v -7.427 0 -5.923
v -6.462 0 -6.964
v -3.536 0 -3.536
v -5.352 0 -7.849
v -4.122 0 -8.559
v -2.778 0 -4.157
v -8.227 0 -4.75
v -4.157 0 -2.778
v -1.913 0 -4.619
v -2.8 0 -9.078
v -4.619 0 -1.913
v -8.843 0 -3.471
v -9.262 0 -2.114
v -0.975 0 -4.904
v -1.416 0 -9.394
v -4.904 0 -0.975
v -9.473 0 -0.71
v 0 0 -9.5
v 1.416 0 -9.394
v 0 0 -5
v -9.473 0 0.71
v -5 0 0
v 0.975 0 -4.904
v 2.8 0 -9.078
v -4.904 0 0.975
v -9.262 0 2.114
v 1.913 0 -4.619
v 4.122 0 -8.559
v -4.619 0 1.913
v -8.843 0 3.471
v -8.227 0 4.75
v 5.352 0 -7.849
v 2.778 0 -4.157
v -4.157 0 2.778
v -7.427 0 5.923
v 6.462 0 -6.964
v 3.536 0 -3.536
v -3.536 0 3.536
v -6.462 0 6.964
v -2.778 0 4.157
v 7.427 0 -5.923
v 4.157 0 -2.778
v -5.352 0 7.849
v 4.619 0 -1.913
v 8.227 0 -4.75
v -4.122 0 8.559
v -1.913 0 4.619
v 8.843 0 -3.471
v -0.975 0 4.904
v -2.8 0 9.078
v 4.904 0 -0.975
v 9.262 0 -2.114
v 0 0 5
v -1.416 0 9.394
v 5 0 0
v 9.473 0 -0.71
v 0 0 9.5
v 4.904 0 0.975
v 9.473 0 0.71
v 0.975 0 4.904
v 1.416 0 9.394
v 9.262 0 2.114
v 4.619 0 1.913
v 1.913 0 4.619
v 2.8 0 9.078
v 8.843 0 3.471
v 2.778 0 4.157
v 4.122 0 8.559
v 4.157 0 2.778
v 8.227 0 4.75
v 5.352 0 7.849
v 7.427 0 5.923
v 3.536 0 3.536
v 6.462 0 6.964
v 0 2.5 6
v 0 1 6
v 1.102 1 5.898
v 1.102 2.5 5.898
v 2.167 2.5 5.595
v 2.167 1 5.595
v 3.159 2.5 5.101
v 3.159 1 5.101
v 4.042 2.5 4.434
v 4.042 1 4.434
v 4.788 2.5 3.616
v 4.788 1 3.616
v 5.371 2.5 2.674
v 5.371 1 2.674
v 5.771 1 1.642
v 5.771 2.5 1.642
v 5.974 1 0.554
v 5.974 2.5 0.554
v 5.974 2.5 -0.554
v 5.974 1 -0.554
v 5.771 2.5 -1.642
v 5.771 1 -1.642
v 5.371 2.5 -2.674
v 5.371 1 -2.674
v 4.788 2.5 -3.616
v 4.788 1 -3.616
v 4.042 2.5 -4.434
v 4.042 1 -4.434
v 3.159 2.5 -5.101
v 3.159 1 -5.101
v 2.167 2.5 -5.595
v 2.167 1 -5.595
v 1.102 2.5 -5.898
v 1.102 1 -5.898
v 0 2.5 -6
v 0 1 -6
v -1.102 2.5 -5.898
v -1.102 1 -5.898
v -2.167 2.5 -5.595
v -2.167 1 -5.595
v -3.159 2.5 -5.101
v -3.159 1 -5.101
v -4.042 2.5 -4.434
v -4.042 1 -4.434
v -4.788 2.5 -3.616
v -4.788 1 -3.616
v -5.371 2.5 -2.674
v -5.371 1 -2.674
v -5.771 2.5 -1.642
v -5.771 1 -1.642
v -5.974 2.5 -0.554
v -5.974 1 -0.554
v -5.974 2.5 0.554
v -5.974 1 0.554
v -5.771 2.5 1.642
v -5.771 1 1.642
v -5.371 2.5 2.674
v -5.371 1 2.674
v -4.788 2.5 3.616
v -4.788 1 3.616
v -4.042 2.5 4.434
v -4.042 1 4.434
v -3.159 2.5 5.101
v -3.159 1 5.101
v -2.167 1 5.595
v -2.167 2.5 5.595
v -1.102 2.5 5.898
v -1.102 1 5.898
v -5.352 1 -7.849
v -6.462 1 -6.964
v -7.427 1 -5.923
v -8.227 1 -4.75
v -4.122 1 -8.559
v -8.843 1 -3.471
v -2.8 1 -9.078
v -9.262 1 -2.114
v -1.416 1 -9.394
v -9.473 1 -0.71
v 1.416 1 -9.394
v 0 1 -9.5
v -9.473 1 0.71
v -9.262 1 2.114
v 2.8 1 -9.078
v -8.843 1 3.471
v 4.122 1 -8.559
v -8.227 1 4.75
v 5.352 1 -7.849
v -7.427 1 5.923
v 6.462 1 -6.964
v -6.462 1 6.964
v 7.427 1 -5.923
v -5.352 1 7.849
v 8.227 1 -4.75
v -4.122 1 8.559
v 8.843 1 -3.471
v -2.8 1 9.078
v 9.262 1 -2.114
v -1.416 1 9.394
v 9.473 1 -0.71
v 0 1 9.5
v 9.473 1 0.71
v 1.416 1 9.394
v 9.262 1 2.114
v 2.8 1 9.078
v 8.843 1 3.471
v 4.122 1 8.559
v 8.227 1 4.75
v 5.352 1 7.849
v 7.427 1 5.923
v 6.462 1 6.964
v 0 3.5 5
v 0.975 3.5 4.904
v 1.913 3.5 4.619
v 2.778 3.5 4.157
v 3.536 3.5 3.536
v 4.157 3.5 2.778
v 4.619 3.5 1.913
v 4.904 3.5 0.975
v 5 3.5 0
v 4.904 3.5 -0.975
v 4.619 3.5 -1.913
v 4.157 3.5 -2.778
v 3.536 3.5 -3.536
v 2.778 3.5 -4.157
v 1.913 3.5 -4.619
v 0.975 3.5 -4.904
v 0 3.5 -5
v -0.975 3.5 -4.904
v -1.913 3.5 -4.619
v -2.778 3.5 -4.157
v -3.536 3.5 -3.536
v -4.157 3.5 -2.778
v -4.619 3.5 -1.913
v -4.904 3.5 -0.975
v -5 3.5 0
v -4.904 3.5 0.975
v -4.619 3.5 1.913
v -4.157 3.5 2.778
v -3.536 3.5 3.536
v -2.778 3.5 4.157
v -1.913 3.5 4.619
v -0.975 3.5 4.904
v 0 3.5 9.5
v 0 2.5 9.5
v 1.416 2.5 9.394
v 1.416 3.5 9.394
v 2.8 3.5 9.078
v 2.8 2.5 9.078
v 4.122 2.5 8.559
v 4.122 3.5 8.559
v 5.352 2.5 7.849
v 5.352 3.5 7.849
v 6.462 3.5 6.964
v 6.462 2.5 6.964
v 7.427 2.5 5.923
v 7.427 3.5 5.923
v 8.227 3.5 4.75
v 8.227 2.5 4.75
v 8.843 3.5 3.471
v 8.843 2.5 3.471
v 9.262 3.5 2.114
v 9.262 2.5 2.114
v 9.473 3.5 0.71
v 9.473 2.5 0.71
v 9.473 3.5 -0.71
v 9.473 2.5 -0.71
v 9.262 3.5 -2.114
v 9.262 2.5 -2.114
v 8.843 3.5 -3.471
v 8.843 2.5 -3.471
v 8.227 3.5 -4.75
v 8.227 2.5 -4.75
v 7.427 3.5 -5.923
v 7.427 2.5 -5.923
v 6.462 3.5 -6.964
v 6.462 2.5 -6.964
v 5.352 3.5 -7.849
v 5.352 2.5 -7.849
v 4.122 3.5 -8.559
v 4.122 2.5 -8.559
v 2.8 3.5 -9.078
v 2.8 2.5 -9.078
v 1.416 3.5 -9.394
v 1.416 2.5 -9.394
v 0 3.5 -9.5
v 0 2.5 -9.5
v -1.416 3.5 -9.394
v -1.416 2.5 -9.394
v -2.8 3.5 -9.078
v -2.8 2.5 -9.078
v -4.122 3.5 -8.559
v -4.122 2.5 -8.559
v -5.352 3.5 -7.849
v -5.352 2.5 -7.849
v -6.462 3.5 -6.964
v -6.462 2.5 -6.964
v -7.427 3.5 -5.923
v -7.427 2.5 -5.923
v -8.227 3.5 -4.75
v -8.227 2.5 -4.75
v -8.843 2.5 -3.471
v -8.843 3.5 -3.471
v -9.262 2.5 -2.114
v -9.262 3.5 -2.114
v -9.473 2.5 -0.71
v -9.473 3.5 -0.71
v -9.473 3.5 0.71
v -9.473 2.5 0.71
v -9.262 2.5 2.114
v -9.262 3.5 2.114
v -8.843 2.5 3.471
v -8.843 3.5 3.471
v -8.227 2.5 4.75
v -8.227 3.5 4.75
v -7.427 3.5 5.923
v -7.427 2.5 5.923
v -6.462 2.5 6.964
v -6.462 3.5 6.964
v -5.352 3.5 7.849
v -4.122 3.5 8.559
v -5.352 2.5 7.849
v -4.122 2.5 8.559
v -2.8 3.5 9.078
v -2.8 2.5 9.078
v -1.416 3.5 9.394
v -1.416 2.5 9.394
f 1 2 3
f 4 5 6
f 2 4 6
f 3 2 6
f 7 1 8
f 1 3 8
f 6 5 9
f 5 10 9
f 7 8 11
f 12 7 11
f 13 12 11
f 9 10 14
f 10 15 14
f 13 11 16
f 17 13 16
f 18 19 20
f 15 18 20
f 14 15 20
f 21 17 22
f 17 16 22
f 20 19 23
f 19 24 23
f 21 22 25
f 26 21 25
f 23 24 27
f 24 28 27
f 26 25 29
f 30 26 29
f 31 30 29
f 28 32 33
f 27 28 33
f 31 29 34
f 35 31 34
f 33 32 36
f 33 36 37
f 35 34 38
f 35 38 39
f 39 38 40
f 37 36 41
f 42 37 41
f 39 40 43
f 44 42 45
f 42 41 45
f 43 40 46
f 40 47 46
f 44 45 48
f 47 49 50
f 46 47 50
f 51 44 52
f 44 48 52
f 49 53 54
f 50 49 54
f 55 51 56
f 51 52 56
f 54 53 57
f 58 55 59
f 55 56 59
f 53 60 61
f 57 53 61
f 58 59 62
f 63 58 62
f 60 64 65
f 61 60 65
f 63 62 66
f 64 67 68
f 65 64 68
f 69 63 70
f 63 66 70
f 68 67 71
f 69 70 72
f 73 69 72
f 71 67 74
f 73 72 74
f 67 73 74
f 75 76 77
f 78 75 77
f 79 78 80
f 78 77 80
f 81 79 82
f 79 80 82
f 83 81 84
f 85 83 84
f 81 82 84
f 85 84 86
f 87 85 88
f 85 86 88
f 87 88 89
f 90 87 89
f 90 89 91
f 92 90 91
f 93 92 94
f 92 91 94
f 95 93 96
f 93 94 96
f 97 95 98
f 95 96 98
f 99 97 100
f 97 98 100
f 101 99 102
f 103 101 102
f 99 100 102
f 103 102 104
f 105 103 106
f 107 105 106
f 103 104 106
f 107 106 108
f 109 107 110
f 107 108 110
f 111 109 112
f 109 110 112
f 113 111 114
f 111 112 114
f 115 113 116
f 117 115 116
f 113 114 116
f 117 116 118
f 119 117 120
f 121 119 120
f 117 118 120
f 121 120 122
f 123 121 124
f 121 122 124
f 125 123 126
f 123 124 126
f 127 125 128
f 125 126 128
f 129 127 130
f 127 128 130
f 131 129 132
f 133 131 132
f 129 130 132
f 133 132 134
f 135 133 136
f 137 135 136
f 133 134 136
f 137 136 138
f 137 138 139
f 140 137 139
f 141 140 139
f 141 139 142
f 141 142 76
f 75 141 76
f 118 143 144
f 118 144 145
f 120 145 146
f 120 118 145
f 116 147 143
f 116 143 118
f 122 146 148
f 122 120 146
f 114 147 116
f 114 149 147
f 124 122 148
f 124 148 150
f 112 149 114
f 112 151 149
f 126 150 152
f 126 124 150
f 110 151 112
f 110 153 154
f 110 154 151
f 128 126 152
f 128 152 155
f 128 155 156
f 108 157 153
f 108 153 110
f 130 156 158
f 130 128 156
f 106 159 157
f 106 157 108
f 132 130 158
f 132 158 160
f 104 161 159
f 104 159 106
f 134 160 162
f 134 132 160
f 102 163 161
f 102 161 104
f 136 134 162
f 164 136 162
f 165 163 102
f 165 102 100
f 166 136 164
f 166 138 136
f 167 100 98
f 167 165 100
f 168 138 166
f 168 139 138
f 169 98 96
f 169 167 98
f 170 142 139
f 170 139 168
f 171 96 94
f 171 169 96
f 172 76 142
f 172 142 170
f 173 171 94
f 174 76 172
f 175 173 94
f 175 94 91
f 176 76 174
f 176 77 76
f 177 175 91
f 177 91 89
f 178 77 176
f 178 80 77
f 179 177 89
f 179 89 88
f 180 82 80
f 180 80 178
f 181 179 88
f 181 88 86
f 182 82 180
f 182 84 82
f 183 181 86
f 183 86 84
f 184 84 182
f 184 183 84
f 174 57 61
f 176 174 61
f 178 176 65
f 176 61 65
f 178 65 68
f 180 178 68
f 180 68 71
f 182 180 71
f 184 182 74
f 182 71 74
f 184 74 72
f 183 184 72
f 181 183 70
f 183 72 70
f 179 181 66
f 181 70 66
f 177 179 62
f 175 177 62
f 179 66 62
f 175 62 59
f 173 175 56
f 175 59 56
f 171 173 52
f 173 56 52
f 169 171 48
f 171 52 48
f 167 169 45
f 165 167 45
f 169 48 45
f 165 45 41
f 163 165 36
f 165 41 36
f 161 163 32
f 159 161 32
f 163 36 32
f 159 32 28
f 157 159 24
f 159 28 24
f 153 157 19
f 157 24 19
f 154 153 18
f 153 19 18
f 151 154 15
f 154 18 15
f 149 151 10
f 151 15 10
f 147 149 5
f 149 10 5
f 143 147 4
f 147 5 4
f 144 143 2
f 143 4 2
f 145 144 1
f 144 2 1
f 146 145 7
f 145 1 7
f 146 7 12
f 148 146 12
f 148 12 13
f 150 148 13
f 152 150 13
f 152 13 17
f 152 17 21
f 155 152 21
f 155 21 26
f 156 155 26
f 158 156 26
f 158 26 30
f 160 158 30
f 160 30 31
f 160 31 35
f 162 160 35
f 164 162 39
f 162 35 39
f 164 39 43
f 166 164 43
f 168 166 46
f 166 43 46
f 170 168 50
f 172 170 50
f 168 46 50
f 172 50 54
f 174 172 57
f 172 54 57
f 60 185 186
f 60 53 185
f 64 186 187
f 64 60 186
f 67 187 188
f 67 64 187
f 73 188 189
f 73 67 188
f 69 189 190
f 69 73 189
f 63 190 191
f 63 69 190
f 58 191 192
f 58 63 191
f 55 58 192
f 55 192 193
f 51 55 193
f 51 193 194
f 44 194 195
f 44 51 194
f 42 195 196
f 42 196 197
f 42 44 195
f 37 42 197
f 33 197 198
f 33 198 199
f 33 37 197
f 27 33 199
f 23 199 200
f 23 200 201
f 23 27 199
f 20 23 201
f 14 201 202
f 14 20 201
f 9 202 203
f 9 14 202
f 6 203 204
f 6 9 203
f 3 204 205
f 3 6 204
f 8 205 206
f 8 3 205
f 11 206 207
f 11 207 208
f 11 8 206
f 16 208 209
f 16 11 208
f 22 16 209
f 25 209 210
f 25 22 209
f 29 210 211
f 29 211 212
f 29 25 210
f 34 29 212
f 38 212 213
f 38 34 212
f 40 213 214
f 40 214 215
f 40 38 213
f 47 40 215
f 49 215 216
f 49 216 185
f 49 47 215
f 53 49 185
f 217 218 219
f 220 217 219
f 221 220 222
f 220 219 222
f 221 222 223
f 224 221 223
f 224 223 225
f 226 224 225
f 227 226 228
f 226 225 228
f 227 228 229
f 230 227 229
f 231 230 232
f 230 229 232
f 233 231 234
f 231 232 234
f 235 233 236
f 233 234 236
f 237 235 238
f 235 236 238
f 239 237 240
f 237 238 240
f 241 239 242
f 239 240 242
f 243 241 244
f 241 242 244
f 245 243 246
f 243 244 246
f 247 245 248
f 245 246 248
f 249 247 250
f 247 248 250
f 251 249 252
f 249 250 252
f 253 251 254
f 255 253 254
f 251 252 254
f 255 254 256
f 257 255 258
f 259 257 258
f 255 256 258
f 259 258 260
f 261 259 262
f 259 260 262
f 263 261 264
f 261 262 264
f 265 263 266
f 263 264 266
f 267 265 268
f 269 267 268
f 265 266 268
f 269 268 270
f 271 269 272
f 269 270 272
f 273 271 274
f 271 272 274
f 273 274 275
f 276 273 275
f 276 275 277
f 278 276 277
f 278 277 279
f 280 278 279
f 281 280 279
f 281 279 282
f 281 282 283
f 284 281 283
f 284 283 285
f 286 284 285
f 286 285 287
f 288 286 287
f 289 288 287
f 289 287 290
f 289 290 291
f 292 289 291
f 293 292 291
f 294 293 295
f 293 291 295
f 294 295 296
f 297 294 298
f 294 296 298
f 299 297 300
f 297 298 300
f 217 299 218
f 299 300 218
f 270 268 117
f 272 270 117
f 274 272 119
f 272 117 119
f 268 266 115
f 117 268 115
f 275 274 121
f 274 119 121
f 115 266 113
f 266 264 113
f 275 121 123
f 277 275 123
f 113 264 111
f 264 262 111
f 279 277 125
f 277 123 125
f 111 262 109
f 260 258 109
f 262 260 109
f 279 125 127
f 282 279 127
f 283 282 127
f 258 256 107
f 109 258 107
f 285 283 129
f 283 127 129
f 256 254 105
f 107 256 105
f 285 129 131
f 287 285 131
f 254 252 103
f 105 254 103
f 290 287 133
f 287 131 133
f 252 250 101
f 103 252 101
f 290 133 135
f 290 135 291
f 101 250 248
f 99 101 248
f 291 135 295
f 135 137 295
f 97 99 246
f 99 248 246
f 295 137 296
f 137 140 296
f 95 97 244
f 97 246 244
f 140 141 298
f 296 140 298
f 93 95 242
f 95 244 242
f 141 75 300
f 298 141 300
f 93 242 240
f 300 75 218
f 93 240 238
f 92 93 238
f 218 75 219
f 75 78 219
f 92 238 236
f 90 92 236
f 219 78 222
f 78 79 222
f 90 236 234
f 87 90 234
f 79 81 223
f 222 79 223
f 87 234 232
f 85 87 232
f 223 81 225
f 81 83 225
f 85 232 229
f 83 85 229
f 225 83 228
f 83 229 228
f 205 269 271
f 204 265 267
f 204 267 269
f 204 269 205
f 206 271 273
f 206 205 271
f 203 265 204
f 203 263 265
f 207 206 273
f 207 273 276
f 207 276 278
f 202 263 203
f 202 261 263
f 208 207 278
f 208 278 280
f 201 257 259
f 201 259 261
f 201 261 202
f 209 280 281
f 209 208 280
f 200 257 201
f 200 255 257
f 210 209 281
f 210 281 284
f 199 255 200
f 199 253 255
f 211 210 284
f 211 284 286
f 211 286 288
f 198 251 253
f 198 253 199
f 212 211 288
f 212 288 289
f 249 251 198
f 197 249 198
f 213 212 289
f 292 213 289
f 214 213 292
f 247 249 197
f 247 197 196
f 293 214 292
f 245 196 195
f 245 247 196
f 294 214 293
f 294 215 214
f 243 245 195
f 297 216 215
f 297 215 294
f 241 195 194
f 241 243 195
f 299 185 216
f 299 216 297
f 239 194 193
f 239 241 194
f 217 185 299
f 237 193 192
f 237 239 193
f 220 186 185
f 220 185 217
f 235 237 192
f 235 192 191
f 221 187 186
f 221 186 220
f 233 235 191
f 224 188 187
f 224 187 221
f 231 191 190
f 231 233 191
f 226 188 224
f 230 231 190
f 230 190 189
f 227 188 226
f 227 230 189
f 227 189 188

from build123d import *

# Parameters (mm, degrees)
SKETCH_1_R      = 9.5
SKETCH_1_R_2    = 5
EXTRUDE_1_DEPTH = 1
SKETCH_2_R      = 6
SKETCH_2_R_2    = 5
EXTRUDE_2_DEPTH = 1.5
SKETCH_3_R      = 9.5
SKETCH_3_R_2    = 5
EXTRUDE_3_DEPTH = 1


with BuildPart() as part:
    # 草图1 → 凸台-拉伸1 (new body)
    with BuildSketch(Plane(origin=(0, 0, 0), x_dir=(1, 0, 0), z_dir=(0, 1, 0))):
        with Locations(Location((0, 0, 0), (0, 0, 270))):
            Circle(SKETCH_1_R)
        with Locations(Location((0, 0, 0), (0, 0, 270))):
            Circle(SKETCH_1_R_2, mode=Mode.SUBTRACT)
    extrude(amount=EXTRUDE_1_DEPTH)

    # 草图2 → 凸台-拉伸2 (add)
    with BuildSketch(Plane(origin=(0, 1, 0), x_dir=(1, 0, 0), z_dir=(0, 1, 0))):
        with Locations(Location((0, 0, 0), (0, 0, 270))):
            Circle(SKETCH_2_R)
        with Locations(Location((0, 0, 0), (0, 0, 270))):
            Circle(SKETCH_2_R_2, mode=Mode.SUBTRACT)
    extrude(amount=EXTRUDE_2_DEPTH)

    # 草图3 → 凸台-拉伸3 (add)
    with BuildSketch(Plane(origin=(0, 2.5, 0), x_dir=(1, 0, 0), z_dir=(0, 1, 0))):
        with Locations(Location((0, 0, 0), (0, 0, 270))):
            Circle(SKETCH_3_R)
        with Locations(Location((0, 0, 0), (0, 0, 270))):
            Circle(SKETCH_3_R_2, mode=Mode.SUBTRACT)
    extrude(amount=EXTRUDE_3_DEPTH)


solid = part.part
